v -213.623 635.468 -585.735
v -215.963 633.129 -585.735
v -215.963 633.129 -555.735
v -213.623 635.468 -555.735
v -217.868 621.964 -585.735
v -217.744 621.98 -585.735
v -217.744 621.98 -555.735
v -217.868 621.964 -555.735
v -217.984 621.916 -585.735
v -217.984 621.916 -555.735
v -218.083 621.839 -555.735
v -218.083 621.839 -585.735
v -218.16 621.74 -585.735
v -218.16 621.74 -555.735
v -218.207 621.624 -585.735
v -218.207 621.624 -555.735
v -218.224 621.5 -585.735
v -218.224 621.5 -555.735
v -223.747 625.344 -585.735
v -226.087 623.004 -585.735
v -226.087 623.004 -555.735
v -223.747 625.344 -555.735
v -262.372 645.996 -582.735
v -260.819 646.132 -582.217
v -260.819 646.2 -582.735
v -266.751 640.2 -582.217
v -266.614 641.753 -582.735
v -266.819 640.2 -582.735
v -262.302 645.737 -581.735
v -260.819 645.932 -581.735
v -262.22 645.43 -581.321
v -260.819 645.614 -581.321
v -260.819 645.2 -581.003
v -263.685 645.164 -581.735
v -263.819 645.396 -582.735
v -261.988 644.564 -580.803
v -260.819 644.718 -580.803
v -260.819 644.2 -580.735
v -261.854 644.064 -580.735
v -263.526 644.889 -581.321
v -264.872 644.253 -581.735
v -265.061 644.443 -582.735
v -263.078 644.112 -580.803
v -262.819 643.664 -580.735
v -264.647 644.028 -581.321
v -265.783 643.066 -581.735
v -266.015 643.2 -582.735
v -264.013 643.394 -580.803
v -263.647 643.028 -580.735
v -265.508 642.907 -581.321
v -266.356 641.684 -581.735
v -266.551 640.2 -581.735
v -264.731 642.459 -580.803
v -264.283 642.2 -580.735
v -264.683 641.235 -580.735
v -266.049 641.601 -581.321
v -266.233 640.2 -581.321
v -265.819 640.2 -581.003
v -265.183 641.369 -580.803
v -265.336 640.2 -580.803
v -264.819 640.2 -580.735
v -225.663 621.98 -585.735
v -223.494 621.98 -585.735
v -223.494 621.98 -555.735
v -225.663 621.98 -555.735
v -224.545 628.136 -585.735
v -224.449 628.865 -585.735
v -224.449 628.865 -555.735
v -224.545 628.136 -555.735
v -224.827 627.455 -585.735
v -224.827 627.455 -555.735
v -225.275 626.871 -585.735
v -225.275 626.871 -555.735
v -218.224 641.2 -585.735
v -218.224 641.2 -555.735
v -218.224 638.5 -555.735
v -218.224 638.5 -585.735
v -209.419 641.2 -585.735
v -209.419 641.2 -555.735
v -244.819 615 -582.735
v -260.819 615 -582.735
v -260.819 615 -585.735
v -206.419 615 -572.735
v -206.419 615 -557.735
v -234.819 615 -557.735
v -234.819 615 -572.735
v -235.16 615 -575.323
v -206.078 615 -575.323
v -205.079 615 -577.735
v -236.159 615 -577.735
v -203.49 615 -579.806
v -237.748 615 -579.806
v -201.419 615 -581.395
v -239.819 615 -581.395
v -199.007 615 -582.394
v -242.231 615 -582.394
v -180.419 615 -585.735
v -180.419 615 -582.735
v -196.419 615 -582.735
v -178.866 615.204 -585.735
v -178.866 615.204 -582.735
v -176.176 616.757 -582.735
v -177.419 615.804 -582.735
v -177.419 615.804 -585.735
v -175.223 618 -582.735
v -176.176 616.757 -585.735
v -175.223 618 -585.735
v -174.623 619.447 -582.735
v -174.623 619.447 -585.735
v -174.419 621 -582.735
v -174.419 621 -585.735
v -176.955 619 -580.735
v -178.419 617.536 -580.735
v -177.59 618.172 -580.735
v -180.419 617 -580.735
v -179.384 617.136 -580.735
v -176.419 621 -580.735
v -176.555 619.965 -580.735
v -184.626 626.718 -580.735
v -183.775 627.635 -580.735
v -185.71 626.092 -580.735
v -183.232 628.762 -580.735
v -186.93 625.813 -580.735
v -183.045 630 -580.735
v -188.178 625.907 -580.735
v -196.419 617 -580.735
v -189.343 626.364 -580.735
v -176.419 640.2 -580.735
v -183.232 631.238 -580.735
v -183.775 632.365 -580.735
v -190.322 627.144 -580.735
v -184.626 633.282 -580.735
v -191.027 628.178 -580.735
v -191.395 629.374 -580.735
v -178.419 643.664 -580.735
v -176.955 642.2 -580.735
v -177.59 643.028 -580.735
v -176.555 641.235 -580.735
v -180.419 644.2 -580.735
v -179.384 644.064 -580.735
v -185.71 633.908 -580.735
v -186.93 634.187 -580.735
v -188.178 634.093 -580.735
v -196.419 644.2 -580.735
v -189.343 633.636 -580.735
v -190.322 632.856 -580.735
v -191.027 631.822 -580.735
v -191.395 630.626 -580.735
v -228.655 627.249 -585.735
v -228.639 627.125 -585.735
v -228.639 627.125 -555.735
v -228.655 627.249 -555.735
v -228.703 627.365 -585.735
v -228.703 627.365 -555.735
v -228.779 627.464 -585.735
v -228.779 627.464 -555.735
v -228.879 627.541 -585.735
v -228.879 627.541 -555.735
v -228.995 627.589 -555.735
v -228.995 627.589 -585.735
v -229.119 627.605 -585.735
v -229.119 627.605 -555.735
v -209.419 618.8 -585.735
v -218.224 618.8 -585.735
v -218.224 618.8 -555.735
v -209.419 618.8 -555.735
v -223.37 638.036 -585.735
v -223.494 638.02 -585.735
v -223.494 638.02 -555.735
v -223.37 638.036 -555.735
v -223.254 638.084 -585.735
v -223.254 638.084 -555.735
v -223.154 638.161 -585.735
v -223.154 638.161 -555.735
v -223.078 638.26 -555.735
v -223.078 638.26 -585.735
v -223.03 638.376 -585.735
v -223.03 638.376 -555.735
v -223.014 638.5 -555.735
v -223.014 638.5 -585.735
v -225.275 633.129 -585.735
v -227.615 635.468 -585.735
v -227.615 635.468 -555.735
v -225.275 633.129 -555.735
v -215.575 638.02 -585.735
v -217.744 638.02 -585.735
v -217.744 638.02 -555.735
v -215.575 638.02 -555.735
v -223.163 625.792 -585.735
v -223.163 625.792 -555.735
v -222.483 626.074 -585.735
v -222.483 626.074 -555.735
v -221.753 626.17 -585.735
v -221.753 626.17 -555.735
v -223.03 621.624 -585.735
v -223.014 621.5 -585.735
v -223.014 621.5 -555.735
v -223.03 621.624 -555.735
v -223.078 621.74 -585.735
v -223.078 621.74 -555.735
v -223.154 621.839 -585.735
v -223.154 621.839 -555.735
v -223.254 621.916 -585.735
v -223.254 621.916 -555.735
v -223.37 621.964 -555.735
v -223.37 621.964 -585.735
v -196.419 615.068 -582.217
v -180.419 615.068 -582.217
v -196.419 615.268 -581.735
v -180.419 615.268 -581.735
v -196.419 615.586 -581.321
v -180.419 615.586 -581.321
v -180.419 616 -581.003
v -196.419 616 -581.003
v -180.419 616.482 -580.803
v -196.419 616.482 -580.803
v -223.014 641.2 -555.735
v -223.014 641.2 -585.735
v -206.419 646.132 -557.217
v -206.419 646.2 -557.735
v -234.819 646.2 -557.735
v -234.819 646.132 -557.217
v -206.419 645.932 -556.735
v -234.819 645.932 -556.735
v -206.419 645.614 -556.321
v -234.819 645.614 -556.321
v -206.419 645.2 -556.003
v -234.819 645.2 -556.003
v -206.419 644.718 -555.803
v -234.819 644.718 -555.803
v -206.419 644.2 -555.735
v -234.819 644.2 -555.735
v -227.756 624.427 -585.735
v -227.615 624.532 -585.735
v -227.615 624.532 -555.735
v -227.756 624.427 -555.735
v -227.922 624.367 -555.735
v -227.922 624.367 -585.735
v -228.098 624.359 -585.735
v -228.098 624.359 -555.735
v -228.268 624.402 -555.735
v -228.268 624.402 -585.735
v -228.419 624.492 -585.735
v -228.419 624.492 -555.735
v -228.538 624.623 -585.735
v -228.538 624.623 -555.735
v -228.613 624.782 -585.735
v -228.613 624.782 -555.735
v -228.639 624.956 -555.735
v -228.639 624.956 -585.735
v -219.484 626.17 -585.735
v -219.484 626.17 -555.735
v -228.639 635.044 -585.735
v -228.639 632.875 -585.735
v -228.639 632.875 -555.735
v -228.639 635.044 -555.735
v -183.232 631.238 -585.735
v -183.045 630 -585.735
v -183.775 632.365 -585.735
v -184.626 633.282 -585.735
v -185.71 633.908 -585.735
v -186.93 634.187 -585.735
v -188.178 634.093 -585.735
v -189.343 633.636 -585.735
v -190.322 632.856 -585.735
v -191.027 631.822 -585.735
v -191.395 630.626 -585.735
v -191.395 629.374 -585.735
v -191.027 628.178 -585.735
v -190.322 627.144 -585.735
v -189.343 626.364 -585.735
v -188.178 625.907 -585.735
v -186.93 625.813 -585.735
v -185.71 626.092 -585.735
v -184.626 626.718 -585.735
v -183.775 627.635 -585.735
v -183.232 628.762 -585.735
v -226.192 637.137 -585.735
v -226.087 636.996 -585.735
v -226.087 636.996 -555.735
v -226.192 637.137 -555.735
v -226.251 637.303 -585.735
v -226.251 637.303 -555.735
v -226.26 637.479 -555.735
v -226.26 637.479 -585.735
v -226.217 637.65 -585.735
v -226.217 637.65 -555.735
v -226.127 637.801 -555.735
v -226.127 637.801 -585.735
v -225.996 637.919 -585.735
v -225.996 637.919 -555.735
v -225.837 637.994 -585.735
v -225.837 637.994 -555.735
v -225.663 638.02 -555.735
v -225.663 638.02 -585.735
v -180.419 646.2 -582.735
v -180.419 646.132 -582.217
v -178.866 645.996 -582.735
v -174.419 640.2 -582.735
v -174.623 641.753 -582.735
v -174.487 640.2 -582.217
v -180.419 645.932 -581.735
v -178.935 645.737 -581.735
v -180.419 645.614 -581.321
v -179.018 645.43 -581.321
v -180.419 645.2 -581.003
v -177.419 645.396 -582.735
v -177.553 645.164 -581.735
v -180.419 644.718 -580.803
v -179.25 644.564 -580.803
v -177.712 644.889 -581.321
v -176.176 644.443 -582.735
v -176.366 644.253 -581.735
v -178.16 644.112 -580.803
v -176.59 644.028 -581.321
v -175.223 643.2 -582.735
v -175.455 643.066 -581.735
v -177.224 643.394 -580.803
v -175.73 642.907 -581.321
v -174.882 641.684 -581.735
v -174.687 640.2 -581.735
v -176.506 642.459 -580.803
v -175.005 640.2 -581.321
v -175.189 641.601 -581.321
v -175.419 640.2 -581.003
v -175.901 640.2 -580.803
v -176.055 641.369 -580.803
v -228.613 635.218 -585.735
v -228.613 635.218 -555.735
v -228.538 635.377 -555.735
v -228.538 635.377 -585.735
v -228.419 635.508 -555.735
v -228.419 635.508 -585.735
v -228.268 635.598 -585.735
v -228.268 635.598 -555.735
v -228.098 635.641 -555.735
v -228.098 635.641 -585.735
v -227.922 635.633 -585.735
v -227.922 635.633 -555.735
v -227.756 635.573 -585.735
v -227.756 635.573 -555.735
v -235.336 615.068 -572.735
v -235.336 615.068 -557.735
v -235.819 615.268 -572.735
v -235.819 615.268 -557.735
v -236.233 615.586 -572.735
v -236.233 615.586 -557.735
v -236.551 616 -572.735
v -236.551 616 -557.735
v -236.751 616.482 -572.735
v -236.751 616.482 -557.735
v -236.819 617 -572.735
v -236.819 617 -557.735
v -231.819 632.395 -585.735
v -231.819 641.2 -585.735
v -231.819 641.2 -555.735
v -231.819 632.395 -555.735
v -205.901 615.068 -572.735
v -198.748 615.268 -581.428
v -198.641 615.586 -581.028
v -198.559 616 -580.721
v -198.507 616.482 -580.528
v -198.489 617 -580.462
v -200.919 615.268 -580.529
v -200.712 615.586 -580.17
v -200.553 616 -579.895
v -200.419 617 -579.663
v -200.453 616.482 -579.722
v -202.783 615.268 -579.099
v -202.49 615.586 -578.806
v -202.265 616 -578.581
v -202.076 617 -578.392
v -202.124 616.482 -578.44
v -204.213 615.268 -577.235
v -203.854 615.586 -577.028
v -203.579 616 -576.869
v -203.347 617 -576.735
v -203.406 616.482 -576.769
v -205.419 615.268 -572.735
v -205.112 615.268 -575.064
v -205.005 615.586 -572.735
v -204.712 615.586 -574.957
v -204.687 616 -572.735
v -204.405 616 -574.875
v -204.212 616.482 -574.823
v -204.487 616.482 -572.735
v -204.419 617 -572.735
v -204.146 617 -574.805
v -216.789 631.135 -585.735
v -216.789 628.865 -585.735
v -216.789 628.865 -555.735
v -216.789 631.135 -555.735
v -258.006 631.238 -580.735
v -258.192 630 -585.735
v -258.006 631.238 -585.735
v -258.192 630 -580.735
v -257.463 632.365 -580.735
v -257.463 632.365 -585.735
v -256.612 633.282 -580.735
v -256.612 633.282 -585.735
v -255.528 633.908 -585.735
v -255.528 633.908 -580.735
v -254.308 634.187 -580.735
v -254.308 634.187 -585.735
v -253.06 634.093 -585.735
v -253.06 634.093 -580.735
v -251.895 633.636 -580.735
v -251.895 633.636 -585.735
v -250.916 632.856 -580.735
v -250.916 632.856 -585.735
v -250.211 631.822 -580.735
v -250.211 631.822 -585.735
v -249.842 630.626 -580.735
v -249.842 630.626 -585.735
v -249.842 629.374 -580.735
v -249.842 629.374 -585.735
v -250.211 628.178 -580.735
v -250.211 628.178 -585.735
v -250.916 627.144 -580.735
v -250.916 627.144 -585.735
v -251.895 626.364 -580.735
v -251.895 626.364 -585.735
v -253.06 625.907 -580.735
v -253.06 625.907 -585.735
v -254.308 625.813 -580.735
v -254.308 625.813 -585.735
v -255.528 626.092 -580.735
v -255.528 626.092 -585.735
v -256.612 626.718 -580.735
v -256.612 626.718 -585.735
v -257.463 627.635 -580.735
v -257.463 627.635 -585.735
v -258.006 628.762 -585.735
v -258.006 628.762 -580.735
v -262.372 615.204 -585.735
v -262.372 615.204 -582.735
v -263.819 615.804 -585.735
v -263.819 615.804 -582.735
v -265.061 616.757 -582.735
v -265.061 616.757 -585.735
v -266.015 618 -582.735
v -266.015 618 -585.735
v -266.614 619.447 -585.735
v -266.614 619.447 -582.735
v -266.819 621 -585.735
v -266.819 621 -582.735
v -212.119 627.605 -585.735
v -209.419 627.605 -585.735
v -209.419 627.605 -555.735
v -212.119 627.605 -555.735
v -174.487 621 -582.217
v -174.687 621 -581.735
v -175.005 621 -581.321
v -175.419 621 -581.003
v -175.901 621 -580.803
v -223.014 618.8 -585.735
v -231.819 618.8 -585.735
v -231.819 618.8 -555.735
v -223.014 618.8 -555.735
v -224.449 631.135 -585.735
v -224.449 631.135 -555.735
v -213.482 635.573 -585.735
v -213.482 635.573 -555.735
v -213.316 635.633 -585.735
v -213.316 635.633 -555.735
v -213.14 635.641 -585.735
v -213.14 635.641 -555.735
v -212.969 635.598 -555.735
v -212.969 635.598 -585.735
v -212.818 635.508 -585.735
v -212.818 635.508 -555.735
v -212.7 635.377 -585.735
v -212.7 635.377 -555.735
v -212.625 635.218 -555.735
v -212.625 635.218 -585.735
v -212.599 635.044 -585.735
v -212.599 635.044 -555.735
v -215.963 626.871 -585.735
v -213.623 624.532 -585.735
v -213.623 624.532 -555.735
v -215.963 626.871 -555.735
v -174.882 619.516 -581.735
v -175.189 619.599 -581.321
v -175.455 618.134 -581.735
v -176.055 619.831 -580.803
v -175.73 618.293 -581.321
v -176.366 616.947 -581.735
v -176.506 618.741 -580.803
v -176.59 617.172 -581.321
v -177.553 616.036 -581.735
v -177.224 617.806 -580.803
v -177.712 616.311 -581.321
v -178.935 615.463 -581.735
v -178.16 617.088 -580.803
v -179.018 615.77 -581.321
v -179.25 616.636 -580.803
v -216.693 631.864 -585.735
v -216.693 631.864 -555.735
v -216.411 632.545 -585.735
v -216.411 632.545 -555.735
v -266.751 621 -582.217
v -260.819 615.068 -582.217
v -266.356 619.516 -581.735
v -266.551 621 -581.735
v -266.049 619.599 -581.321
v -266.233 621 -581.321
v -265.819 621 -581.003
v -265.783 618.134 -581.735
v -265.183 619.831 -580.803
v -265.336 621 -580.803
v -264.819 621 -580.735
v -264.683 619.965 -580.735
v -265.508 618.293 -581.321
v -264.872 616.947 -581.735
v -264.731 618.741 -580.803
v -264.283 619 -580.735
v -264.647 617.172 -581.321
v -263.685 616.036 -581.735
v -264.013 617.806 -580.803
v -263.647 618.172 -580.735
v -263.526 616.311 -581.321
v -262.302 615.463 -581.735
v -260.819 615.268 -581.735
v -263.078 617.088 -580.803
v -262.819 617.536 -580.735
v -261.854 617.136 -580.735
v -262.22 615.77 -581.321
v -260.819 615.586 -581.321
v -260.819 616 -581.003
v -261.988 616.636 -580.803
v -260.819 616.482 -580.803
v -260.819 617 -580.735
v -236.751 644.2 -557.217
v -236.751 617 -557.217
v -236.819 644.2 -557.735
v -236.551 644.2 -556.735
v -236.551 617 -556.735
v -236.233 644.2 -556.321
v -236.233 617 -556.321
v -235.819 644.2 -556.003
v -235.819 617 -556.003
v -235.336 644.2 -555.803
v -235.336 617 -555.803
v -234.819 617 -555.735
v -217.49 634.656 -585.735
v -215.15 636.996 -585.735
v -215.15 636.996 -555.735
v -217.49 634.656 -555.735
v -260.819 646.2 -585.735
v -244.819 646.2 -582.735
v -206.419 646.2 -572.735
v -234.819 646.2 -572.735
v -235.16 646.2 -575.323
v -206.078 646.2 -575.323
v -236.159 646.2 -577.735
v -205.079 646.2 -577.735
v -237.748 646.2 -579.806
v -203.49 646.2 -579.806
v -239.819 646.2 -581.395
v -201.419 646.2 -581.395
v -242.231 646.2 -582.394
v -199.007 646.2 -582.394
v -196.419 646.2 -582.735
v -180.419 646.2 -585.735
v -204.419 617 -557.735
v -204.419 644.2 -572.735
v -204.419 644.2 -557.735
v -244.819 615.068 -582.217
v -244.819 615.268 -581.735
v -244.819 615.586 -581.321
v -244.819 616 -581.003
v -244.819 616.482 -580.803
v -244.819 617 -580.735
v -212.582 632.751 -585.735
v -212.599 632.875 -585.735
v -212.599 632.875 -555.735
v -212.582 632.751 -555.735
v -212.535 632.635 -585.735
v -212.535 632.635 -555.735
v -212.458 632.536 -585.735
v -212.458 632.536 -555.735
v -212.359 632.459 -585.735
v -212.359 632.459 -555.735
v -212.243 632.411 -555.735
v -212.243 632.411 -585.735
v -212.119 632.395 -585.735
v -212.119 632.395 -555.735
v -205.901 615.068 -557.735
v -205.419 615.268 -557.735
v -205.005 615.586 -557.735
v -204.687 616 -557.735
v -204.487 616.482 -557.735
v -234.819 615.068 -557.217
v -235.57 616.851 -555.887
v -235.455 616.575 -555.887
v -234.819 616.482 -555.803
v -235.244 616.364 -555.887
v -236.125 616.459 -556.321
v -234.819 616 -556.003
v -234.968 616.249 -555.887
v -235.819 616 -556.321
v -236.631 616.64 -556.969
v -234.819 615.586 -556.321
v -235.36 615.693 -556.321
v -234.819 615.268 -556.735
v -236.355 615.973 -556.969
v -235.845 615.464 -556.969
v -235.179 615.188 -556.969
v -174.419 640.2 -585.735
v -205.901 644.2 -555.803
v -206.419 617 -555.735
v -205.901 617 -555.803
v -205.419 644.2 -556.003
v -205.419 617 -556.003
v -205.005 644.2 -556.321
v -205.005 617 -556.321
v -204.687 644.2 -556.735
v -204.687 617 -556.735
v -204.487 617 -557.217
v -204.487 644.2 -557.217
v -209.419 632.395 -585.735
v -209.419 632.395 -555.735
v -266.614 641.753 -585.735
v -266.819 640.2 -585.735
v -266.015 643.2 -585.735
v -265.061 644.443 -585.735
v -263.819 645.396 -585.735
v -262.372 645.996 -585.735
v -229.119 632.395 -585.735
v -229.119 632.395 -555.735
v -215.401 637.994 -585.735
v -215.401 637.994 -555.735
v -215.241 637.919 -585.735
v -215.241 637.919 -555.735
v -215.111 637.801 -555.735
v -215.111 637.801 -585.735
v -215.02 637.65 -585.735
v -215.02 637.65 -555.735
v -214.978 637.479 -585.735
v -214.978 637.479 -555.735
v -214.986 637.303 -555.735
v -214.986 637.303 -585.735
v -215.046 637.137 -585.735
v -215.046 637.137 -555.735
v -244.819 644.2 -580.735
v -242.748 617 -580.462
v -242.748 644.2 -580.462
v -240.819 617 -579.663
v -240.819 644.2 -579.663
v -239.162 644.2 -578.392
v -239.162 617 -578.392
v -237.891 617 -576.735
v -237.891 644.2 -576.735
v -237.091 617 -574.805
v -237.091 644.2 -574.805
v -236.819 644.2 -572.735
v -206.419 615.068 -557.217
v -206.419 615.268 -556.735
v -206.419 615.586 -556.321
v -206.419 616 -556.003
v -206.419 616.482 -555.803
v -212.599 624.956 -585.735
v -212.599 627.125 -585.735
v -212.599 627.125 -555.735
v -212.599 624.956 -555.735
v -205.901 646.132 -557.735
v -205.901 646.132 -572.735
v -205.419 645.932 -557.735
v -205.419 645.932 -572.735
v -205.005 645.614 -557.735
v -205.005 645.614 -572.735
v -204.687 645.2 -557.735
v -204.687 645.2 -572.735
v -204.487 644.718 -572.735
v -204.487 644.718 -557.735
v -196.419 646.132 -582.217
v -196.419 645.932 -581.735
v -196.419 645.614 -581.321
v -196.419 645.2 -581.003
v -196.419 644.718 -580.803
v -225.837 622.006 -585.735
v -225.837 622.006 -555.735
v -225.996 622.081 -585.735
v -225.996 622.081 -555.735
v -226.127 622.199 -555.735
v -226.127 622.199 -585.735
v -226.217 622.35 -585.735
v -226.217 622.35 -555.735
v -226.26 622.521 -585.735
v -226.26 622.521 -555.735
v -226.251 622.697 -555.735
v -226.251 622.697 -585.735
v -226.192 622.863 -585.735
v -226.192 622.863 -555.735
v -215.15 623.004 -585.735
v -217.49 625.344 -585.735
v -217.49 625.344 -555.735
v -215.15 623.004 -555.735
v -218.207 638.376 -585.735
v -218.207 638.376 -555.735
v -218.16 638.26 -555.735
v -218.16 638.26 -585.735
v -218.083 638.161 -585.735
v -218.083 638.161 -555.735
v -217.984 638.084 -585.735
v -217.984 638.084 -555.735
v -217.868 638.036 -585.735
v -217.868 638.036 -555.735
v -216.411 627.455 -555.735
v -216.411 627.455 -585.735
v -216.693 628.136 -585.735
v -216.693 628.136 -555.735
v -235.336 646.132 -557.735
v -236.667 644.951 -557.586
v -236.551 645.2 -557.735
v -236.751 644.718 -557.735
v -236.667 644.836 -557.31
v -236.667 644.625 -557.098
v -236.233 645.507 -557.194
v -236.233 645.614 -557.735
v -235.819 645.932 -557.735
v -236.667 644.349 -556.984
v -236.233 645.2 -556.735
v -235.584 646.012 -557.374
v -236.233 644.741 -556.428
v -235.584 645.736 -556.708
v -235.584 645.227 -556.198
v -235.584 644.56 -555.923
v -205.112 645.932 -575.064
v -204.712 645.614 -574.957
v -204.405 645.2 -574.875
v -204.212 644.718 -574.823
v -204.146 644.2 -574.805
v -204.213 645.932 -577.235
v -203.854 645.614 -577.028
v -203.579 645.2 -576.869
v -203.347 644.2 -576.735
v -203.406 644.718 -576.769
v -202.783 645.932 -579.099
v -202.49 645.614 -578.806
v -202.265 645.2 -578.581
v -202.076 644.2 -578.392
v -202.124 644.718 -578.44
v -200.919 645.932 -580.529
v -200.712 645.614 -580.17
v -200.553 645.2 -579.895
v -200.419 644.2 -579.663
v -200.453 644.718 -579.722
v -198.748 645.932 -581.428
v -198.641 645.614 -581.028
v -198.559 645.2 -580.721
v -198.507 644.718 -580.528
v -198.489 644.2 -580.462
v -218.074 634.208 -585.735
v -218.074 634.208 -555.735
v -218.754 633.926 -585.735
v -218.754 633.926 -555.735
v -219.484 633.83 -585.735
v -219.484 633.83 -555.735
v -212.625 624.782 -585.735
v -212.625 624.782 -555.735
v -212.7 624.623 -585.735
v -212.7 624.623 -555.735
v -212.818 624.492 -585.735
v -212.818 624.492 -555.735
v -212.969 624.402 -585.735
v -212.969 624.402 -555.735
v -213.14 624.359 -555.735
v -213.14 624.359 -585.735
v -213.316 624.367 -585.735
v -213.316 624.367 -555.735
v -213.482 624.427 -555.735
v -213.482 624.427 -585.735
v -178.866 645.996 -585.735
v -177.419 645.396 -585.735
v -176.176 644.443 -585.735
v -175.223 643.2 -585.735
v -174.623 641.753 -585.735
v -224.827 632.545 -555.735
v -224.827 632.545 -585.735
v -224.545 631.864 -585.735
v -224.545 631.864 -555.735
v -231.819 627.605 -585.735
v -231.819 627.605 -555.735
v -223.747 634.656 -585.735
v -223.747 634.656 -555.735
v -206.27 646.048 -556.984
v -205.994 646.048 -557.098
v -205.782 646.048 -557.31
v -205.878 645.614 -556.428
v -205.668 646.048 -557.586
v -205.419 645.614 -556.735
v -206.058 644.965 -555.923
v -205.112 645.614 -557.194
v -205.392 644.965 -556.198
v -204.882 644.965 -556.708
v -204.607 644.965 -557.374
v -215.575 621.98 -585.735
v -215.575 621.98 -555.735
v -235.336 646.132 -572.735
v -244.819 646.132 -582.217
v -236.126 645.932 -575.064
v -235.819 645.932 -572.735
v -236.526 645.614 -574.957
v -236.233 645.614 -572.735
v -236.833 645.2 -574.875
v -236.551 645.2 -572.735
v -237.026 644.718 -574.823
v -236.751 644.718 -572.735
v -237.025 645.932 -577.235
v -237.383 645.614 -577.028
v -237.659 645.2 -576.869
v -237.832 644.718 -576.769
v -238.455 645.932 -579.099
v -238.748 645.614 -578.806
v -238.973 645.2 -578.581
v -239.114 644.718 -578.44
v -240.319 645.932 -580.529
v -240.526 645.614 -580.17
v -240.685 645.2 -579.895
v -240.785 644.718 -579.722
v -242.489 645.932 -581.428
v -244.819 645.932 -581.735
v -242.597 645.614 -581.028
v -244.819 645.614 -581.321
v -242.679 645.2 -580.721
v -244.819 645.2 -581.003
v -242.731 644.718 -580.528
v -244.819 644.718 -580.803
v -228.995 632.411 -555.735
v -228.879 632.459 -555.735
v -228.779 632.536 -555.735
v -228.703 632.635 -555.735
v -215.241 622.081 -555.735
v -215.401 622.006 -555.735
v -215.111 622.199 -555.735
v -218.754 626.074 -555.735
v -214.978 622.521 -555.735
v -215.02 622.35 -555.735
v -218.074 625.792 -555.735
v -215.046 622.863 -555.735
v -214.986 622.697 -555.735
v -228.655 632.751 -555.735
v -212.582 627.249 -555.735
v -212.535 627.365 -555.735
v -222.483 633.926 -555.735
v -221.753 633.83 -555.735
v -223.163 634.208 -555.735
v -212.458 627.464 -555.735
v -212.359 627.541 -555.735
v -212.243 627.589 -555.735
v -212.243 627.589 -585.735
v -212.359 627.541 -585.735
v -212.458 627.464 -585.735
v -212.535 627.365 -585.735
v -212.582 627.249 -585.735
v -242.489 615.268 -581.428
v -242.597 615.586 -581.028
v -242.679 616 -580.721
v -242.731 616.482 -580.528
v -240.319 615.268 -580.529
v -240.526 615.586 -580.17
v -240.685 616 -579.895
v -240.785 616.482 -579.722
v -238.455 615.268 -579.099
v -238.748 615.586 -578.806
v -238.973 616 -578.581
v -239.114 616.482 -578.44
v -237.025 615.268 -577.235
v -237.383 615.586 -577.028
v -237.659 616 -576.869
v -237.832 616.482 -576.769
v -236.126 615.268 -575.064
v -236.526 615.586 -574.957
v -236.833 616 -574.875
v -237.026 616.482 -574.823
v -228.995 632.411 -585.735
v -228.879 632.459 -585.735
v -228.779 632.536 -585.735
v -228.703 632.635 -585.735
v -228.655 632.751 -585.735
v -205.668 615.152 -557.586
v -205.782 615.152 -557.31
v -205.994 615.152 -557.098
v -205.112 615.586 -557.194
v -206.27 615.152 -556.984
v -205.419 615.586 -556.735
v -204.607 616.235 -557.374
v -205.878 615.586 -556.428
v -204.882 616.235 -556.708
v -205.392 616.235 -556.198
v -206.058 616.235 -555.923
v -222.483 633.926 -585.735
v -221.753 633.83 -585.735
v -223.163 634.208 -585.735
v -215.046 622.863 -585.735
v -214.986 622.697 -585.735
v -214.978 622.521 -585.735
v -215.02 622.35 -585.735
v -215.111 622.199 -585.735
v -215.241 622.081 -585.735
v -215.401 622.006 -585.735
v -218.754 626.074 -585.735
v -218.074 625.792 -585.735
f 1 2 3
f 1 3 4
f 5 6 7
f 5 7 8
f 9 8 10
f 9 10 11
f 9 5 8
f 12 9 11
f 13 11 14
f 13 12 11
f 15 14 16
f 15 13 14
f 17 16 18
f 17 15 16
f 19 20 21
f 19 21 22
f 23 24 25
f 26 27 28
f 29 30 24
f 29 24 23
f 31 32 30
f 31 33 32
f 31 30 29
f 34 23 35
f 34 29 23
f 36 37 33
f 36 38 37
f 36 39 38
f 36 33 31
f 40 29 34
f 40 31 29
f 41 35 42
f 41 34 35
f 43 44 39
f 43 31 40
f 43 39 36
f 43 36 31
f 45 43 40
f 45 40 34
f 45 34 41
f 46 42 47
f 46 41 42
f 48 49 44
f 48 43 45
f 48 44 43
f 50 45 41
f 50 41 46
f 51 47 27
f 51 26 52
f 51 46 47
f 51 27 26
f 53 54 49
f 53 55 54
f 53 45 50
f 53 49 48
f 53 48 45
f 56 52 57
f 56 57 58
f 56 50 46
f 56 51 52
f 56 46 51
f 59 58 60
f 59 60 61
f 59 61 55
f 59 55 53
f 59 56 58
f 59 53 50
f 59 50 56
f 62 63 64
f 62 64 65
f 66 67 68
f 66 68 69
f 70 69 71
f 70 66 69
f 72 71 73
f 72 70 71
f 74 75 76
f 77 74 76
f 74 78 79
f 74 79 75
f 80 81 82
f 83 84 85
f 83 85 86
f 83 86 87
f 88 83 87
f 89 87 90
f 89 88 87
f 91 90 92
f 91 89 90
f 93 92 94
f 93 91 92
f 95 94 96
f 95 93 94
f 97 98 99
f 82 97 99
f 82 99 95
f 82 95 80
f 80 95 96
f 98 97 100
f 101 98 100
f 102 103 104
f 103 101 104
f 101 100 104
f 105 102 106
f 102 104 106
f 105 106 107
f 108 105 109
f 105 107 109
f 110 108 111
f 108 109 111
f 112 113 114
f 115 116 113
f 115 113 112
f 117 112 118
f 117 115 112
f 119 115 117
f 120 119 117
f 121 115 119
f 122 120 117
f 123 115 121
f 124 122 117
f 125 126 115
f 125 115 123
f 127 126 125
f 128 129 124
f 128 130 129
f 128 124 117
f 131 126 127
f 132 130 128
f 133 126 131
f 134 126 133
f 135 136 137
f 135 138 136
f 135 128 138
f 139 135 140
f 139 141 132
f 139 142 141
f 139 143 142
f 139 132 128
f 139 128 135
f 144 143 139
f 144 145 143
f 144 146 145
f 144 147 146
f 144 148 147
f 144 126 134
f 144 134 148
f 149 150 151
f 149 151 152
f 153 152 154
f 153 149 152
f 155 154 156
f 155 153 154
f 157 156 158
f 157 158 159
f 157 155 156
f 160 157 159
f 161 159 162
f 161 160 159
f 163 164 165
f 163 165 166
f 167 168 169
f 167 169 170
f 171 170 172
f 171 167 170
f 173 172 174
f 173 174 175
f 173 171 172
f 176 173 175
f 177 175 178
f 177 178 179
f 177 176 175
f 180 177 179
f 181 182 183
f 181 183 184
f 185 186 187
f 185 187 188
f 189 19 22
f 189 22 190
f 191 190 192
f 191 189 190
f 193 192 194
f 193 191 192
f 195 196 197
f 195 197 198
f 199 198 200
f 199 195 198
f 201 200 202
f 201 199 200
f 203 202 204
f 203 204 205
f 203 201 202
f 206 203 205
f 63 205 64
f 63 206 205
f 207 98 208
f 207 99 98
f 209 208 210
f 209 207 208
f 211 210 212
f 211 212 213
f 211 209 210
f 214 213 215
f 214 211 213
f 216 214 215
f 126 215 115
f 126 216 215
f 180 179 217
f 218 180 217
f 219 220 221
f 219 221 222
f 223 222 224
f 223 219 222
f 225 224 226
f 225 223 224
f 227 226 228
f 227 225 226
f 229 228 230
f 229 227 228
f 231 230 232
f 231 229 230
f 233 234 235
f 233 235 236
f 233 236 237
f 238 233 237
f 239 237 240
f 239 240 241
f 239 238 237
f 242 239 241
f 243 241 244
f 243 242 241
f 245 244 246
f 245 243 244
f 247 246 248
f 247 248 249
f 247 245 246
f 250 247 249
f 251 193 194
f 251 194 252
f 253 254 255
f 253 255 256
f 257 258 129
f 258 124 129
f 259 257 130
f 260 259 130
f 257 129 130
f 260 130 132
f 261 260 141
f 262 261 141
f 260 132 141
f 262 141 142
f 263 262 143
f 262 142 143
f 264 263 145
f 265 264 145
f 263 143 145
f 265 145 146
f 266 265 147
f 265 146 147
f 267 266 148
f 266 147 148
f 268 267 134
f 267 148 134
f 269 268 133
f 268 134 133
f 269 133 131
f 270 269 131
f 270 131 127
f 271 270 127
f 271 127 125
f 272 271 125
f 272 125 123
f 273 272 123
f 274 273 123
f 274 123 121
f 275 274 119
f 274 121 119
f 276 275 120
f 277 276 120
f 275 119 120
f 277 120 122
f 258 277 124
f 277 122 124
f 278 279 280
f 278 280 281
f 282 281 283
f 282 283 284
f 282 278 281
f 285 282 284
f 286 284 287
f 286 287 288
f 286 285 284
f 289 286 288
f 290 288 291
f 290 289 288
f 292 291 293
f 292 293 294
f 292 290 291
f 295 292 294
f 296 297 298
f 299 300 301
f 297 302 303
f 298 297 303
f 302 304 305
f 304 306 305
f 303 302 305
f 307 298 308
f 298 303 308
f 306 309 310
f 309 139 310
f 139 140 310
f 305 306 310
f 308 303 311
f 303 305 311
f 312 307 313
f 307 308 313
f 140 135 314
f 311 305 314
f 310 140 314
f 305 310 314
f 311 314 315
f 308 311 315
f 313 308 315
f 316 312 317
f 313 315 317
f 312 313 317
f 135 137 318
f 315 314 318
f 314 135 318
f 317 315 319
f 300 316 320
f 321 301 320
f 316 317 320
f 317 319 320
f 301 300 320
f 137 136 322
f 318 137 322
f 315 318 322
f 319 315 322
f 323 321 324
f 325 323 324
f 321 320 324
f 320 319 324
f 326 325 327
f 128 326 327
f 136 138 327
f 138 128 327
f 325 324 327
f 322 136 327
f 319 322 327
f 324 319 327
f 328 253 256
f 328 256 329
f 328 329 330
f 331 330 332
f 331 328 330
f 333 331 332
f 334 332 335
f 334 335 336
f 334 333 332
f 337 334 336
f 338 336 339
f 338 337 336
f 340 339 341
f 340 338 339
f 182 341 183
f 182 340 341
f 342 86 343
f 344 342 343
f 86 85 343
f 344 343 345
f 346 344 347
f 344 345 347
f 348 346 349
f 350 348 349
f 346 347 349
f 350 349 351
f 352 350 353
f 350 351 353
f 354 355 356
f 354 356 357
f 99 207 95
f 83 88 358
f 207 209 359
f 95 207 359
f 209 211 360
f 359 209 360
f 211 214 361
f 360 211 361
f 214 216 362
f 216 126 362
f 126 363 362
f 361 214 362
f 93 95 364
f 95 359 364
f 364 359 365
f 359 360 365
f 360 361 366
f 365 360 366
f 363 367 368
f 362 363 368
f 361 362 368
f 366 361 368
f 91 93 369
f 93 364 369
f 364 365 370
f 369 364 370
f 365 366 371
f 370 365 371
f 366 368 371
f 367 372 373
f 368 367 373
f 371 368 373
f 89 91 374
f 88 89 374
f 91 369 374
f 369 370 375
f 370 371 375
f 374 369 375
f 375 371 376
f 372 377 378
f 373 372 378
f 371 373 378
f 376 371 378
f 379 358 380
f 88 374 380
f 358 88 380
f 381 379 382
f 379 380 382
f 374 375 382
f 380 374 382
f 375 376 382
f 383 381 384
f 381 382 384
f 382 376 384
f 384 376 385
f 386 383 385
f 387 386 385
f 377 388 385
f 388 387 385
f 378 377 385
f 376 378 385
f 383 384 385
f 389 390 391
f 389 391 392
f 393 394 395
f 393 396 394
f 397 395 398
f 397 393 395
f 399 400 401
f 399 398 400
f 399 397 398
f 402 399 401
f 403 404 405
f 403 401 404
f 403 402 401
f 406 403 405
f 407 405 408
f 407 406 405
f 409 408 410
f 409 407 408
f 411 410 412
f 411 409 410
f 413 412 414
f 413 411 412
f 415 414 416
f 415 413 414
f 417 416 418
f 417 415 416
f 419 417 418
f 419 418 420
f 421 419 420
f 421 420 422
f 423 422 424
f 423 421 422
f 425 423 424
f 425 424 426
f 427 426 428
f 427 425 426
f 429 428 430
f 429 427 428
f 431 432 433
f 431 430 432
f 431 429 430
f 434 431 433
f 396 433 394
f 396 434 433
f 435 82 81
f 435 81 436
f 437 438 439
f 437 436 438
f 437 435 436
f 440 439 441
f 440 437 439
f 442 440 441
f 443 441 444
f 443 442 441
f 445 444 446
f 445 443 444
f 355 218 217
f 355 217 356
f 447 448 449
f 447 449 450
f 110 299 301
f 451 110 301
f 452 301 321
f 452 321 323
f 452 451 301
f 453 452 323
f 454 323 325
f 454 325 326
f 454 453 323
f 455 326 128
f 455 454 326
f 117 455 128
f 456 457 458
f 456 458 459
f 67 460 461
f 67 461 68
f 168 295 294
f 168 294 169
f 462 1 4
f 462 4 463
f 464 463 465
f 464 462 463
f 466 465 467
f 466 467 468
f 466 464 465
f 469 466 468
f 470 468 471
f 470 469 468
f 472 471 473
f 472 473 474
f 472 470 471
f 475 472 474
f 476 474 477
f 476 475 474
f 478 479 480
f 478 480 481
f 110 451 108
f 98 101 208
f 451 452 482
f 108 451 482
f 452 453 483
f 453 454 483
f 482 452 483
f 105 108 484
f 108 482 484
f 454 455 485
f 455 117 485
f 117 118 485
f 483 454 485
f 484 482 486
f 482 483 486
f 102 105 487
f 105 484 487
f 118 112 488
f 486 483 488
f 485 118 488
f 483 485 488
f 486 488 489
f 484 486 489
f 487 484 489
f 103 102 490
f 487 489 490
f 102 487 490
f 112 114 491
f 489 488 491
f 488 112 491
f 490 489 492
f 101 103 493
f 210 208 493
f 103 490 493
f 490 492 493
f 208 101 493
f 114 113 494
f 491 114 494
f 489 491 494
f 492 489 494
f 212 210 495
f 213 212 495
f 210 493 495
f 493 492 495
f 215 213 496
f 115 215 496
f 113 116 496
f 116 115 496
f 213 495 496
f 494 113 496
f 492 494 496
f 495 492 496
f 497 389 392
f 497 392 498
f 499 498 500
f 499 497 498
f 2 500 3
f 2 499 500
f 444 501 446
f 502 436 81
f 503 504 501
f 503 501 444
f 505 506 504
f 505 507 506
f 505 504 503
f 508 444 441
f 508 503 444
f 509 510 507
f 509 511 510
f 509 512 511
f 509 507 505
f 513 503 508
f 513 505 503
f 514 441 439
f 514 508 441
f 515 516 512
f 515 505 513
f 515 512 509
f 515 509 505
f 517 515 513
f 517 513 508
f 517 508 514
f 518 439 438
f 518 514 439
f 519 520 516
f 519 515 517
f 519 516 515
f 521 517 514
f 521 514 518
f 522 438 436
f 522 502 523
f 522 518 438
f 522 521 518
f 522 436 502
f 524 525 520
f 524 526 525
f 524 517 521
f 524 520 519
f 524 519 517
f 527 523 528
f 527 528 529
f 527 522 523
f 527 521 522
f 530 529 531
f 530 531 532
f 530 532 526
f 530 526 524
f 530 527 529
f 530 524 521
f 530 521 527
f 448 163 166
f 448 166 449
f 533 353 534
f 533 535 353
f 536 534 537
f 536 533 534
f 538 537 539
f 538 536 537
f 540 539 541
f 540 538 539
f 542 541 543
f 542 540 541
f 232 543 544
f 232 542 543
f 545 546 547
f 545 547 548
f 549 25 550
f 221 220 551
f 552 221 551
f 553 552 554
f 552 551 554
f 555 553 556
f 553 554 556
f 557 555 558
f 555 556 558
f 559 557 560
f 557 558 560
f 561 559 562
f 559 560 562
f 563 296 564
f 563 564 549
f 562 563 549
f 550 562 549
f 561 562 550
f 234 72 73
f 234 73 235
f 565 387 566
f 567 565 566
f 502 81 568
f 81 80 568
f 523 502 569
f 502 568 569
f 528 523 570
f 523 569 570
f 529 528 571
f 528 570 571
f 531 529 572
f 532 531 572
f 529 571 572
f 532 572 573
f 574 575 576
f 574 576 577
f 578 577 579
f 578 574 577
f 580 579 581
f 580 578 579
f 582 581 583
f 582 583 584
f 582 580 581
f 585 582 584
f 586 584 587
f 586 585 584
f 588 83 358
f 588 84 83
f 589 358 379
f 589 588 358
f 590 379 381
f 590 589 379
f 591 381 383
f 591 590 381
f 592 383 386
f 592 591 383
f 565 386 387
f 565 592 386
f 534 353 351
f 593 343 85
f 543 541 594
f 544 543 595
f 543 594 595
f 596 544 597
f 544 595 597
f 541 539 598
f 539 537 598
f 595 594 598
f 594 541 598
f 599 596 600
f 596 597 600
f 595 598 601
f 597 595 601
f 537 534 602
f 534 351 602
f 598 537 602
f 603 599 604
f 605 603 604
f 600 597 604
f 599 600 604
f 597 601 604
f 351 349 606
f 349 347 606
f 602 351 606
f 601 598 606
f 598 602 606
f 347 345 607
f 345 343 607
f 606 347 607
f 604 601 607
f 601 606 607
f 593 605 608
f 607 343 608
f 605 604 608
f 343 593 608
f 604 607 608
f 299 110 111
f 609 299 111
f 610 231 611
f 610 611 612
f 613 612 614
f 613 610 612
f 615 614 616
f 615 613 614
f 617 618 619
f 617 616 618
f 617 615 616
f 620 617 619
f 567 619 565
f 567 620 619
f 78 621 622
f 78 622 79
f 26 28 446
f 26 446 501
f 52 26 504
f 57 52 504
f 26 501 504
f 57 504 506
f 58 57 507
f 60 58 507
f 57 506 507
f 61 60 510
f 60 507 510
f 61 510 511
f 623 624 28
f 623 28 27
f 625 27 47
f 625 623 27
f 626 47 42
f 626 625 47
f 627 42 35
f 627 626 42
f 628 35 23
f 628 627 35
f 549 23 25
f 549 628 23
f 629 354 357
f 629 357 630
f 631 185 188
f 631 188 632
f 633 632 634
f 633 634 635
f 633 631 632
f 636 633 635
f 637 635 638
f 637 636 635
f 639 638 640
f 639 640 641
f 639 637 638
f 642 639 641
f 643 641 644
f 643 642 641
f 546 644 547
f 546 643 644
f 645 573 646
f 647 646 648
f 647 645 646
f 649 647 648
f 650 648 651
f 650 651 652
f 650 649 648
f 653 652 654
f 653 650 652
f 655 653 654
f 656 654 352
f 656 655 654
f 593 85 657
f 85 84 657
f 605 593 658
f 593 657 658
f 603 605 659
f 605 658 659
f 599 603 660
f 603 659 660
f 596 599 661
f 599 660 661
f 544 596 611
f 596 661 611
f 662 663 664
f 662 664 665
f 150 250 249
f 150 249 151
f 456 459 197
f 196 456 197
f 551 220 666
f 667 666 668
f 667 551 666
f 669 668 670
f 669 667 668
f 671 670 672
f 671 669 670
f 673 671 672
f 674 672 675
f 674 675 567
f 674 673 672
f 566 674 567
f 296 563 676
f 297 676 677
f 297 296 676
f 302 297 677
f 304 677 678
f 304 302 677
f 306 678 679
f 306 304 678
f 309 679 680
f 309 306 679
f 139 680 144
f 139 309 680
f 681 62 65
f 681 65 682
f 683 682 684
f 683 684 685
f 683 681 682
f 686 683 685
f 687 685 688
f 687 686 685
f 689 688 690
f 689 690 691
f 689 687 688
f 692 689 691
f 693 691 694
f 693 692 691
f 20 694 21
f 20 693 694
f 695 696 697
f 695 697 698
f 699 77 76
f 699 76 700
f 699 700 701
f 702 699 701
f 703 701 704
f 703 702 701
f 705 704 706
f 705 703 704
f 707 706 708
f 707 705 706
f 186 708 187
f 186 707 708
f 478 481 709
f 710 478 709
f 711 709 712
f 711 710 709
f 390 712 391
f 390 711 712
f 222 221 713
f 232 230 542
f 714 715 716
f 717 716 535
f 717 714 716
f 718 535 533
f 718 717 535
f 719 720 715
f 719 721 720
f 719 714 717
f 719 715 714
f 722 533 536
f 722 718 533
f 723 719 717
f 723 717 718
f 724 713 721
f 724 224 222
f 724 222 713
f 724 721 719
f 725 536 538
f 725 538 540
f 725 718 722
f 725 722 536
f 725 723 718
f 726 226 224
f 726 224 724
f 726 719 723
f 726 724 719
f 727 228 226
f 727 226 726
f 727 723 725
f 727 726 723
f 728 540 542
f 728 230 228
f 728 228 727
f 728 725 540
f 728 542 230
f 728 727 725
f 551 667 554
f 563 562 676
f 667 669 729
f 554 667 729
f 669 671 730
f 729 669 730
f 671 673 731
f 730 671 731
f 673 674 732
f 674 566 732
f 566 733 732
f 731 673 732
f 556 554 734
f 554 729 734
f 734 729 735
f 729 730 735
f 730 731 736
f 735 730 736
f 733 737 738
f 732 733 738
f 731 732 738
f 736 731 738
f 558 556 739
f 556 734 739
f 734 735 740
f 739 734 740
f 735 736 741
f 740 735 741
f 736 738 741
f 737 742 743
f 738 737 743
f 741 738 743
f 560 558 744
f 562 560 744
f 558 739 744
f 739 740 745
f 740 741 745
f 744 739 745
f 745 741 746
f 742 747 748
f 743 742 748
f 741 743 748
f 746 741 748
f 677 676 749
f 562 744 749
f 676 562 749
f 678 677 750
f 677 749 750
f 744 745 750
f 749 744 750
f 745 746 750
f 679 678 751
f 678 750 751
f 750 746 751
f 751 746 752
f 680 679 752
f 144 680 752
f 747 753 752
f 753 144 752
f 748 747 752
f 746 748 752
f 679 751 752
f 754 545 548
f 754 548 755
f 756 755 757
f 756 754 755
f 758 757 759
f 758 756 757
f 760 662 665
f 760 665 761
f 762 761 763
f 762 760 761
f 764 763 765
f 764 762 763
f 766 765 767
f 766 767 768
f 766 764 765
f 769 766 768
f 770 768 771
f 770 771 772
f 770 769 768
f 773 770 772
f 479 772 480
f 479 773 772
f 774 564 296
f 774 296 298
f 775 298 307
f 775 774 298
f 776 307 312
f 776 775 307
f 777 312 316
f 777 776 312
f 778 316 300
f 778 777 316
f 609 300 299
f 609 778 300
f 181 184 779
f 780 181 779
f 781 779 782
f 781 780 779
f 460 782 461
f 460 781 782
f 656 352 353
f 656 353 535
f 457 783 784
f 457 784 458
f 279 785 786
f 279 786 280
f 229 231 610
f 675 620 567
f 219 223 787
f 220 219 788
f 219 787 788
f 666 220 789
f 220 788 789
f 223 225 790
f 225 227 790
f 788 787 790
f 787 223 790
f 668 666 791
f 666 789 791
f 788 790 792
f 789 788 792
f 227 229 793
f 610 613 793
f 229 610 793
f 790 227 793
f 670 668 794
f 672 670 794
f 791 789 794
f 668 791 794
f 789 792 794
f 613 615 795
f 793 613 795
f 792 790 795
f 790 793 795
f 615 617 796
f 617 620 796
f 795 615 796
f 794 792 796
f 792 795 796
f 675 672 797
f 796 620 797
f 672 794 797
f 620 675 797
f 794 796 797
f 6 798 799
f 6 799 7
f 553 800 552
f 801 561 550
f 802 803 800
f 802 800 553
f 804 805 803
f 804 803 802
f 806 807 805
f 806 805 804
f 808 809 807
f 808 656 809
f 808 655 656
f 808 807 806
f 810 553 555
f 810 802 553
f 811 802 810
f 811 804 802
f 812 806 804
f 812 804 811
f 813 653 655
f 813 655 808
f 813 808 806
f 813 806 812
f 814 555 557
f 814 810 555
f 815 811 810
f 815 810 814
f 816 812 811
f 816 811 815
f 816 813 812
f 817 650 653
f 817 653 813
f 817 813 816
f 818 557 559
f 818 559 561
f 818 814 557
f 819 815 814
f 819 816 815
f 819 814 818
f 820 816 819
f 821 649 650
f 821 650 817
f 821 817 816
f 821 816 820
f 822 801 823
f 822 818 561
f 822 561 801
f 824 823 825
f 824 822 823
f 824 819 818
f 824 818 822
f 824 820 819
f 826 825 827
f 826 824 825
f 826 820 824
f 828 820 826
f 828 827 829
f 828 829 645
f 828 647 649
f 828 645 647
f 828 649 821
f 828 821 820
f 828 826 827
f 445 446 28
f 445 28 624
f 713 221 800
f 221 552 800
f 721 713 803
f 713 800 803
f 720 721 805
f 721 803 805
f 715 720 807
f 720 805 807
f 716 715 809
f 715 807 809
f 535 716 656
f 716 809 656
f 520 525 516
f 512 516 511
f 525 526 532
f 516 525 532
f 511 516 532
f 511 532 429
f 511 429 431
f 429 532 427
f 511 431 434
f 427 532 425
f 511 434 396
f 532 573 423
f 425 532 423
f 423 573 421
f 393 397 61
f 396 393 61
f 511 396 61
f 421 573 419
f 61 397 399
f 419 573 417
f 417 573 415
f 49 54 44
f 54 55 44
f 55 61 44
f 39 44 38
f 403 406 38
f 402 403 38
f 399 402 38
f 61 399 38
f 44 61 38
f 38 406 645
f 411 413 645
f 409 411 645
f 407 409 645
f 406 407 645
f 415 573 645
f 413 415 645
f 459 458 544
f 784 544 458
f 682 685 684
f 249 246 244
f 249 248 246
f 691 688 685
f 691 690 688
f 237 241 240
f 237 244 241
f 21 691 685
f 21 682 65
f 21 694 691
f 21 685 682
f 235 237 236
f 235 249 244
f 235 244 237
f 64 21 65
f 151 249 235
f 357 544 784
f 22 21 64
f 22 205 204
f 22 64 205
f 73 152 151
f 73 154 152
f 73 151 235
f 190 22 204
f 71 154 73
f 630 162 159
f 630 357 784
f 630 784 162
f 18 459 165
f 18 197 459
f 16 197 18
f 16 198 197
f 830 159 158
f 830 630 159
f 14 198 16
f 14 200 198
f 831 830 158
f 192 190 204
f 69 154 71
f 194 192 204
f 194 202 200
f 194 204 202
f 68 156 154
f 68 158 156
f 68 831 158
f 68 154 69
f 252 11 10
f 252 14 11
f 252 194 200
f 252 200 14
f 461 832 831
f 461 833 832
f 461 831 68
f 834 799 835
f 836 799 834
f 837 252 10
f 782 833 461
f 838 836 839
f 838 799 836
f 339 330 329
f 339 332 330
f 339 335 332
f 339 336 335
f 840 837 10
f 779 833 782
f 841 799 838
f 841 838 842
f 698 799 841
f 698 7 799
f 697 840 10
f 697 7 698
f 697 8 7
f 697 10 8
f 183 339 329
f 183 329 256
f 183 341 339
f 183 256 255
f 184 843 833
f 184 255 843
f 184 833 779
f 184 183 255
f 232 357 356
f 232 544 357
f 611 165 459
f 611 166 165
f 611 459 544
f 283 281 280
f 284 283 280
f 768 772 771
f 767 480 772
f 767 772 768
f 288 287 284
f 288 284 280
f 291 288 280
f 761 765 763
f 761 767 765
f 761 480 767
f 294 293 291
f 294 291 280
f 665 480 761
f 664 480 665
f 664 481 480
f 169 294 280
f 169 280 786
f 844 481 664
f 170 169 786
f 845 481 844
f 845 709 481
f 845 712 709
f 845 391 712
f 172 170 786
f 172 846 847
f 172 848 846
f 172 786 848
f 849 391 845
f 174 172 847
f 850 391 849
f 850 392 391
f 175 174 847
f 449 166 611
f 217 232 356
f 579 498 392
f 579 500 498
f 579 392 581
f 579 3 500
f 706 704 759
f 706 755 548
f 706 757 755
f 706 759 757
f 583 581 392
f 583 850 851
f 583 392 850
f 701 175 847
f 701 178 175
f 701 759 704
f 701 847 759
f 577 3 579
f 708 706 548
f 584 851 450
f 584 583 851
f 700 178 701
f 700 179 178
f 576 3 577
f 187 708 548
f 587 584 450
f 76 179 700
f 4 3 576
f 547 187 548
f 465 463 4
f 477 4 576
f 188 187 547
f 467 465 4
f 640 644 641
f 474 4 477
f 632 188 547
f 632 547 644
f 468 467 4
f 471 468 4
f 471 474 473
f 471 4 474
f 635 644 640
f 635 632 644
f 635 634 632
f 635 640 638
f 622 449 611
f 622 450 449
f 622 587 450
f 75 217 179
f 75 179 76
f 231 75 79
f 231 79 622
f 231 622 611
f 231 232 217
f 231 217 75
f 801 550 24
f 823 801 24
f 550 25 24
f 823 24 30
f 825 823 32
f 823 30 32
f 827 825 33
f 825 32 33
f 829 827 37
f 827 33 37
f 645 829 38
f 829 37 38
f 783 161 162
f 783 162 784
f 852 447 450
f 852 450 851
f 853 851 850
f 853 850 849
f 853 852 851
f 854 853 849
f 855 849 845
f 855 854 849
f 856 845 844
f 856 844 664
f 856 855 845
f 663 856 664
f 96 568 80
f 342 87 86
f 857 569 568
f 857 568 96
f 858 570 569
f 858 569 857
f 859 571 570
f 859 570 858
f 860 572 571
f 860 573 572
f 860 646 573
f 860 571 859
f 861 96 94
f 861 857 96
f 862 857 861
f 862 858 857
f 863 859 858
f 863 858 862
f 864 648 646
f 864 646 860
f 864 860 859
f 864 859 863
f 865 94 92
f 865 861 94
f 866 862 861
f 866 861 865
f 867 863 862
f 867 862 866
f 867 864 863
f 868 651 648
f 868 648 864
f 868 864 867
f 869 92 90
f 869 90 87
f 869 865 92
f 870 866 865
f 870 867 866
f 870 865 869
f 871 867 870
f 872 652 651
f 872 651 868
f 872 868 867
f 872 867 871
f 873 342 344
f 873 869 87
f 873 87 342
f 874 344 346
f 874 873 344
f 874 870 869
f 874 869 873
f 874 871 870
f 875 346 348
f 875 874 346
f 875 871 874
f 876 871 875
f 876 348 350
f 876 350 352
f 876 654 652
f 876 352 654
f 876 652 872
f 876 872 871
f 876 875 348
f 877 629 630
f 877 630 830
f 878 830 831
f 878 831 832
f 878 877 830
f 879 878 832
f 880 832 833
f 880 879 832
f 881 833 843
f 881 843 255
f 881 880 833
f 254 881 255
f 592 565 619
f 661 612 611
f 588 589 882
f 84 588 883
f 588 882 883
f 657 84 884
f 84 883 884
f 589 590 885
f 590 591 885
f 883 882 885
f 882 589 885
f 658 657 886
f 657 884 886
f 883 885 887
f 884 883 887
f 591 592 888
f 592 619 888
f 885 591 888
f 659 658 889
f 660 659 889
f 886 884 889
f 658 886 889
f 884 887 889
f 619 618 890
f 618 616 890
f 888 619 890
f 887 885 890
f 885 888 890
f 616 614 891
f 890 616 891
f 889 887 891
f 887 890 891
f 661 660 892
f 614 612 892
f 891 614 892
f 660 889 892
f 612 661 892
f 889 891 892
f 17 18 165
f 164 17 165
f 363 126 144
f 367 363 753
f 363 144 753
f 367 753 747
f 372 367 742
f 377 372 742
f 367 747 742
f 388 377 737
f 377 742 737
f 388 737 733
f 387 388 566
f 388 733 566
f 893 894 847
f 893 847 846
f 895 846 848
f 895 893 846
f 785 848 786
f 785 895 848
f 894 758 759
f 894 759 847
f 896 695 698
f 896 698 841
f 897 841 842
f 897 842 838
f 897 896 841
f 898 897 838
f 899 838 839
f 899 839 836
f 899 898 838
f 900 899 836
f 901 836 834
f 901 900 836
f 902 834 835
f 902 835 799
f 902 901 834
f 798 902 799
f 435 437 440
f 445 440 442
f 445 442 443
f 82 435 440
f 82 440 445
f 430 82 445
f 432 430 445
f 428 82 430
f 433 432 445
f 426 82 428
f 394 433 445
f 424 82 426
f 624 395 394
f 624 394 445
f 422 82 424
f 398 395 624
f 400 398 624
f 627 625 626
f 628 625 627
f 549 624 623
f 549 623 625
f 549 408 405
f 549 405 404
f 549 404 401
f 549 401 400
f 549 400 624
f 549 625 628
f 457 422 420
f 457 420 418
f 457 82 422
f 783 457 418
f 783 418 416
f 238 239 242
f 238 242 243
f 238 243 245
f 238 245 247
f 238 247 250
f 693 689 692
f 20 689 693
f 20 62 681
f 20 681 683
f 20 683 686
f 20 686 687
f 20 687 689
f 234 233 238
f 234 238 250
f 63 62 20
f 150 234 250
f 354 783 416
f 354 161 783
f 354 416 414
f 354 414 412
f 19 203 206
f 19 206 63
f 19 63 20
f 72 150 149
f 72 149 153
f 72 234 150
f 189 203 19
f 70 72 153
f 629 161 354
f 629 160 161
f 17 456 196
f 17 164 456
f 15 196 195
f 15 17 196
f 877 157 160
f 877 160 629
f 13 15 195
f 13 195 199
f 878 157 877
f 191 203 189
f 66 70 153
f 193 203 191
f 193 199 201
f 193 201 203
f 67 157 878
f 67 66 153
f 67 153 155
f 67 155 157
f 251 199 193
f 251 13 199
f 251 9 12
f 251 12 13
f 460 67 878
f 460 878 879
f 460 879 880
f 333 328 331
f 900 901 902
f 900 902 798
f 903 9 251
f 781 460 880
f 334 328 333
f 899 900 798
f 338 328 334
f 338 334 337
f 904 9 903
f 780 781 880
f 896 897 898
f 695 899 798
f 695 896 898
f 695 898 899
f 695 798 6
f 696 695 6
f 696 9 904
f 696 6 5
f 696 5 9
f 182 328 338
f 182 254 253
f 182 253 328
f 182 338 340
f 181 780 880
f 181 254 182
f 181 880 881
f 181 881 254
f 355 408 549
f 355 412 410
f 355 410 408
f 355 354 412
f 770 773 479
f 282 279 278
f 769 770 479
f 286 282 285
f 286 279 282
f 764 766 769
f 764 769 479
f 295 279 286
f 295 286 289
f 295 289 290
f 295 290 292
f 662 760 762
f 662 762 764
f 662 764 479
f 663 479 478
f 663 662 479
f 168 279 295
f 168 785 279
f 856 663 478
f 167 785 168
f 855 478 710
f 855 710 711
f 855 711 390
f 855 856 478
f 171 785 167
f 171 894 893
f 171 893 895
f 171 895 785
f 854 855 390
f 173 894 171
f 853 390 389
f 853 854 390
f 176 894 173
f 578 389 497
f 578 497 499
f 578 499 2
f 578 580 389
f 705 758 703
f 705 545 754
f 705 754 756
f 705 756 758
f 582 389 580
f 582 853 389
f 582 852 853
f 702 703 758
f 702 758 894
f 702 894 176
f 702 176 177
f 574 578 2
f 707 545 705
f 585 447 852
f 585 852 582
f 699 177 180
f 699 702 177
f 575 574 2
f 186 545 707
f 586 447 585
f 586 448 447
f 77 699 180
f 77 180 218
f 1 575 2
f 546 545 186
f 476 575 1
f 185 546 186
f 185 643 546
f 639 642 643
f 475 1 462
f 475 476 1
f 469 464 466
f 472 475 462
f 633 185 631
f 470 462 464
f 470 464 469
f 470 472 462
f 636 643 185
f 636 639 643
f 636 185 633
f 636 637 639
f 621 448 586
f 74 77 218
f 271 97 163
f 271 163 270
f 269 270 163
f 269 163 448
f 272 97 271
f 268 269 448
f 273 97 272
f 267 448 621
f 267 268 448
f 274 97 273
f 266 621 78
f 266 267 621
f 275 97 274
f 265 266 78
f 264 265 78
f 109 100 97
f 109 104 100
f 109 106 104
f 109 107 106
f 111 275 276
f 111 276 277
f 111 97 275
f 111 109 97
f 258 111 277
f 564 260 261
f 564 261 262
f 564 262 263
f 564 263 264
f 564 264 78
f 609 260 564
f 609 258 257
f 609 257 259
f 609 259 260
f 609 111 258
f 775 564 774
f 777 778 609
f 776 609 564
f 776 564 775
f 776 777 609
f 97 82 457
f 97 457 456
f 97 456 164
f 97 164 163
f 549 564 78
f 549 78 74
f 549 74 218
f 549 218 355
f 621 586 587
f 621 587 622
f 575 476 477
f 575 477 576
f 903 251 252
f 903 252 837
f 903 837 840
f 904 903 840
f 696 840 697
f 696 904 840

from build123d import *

# Parameters (mm, degrees)
SKETCH2_W           = 32.4
SKETCH2_H           = 31.2
BOSS_EXTRUDE1_DEPTH = 30
SKETCH3_W           = 5
SKETCH3_H           = 31.2
BOSS_EXTRUDE2_DEPTH = 30
SKETCH4_R           = 4.198469776
CUT_EXTRUDE1_DEPTH  = 15
FILLET6_R           = 8
FILLET7_R           = 6
FILLET8_R           = 2


with BuildPart() as part:
    # Sketch2 → Boss-Extrude1 (new body)
    with BuildSketch(Plane.XY.offset(-585.734831934)):
        with Locations((-220.618842126, 630.6)):
            Rectangle(SKETCH2_W, SKETCH2_H)
        with BuildLine():
            Line((-218.223842126, 639.2), (-218.223842126, 638.500000763))
            ThreePointArc((-218.223842126, 638.500000763), (-218.083253443, 638.160589569), (-217.743842299, 638.020000763))
            Line((-217.743842299, 638.020000763), (-215.574720714, 638.019999981))
            ThreePointArc((-215.574720714, 638.019999981), (-215.020393169, 637.649609941), (-215.150456861, 636.995735913))
            Line((-215.150456861, 636.995735913), (-217.490233892, 634.655958882))
            ThreePointArc((-217.490233892, 634.655958882), (-218.405107733, 634.044659724), (-219.484275009, 633.830000005))
            Line((-219.484275009, 633.830000005), (-221.753409227, 633.83))
            ThreePointArc((-221.753409227, 633.83), (-222.83257651, 634.044659717), (-223.747450356, 634.655958877))
            Line((-223.747450356, 634.655958877), (-226.087227386, 636.995735907))
            ThreePointArc((-226.087227386, 636.995735907), (-226.217291078, 637.649609934), (-225.662963535, 638.019999975))
            Line((-225.662963535, 638.019999975), (-223.493841952, 638.020000763))
            ThreePointArc((-223.493841952, 638.020000763), (-223.15443081, 638.16058957), (-223.013842126, 638.500000763))
            Line((-223.013842126, 638.500000763), (-223.013842126, 639.2))
            Line((-223.013842126, 639.2), (-223.013842126, 641.2))
            Line((-223.013842126, 641.2), (-231.818842126, 641.2))
            Line((-231.818842126, 641.2), (-231.818842126, 632.395))
            Line((-231.818842126, 632.395), (-229.818842126, 632.395))
            Line((-229.818842126, 632.395), (-229.118842889, 632.395))
            ThreePointArc((-229.118842889, 632.395), (-228.779431696, 632.535588684), (-228.638842889, 632.874999827))
            Line((-228.638842889, 632.874999827), (-228.638842108, 635.044121413))
            ThreePointArc((-228.638842108, 635.044121413), (-228.268452067, 635.598448957), (-227.614578039, 635.468385265))
            Line((-227.614578039, 635.468385265), (-225.274801008, 633.128608235))
            ThreePointArc((-225.274801008, 633.128608235), (-224.663501851, 632.213734394), (-224.448842131, 631.134567117))
            Line((-224.448842131, 631.134567117), (-224.448842127, 628.865432899))
            ThreePointArc((-224.448842127, 628.865432899), (-224.663501844, 627.786265617), (-225.274801004, 626.87139177))
            Line((-225.274801004, 626.87139177), (-227.614578033, 624.531614741))
            ThreePointArc((-227.614578033, 624.531614741), (-228.268452061, 624.401551048), (-228.638842102, 624.955878592))
            Line((-228.638842102, 624.955878592), (-228.638842889, 627.125000174))
            ThreePointArc((-228.638842889, 627.125000174), (-228.779431696, 627.464411317), (-229.118842889, 627.605))
            Line((-229.118842889, 627.605), (-229.818842126, 627.605))
            Line((-229.818842126, 627.605), (-231.818842126, 627.605))
            Line((-231.818842126, 627.605), (-231.818842126, 618.8))
            Line((-231.818842126, 618.8), (-223.013842126, 618.8))
            Line((-223.013842126, 618.8), (-223.013842126, 620.8))
            Line((-223.013842126, 620.8), (-223.013842126, 621.499999237))
            ThreePointArc((-223.013842126, 621.499999237), (-223.15443081, 621.839410431), (-223.493841954, 621.979999237))
            Line((-223.493841954, 621.979999237), (-225.662963539, 621.980000019))
            ThreePointArc((-225.662963539, 621.980000019), (-226.217291084, 622.350390059), (-226.087227392, 623.004264087))
            Line((-226.087227392, 623.004264087), (-223.747450361, 625.344041118))
            ThreePointArc((-223.747450361, 625.344041118), (-222.83257652, 625.955340276), (-221.753409244, 626.169999995))
            Line((-221.753409244, 626.169999995), (-219.484275025, 626.17))
            ThreePointArc((-219.484275025, 626.17), (-218.405107743, 625.955340283), (-217.490233897, 625.344041123))
            Line((-217.490233897, 625.344041123), (-215.150456867, 623.004264093))
            ThreePointArc((-215.150456867, 623.004264093), (-215.020393175, 622.350390066), (-215.574720718, 621.980000025))
            Line((-215.574720718, 621.980000025), (-217.743842301, 621.979999237))
            ThreePointArc((-217.743842301, 621.979999237), (-218.083253443, 621.83941043), (-218.223842126, 621.499999237))
            Line((-218.223842126, 621.499999237), (-218.223842126, 620.8))
            Line((-218.223842126, 620.8), (-218.223842126, 618.8))
            Line((-218.223842126, 618.8), (-209.418842126, 618.8))
            Line((-209.418842126, 618.8), (-209.418842126, 627.605))
            Line((-209.418842126, 627.605), (-211.418842126, 627.605))
            Line((-211.418842126, 627.605), (-212.118841364, 627.605))
            ThreePointArc((-212.118841364, 627.605), (-212.458252557, 627.464411316), (-212.598841364, 627.125000173))
            Line((-212.598841364, 627.125000173), (-212.598842145, 624.955878587))
            ThreePointArc((-212.598842145, 624.955878587), (-212.969232185, 624.401551043), (-213.623106214, 624.531614735))
            Line((-213.623106214, 624.531614735), (-215.962883245, 626.871391765))
            ThreePointArc((-215.962883245, 626.871391765), (-216.574182402, 627.786265606), (-216.788842122, 628.865432883))
            Line((-216.788842122, 628.865432883), (-216.788842126, 631.134567101))
            ThreePointArc((-216.788842126, 631.134567101), (-216.574182409, 632.213734383), (-215.962883249, 633.12860823))
            Line((-215.962883249, 633.12860823), (-213.62310622, 635.468385259))
            ThreePointArc((-213.62310622, 635.468385259), (-212.969232192, 635.598448952), (-212.598842151, 635.044121408))
            Line((-212.598842151, 635.044121408), (-212.598841364, 632.874999826))
            ThreePointArc((-212.598841364, 632.874999826), (-212.458252557, 632.535588683), (-212.118841364, 632.395))
            Line((-212.118841364, 632.395), (-211.418842126, 632.395))
            Line((-211.418842126, 632.395), (-209.418842126, 632.395))
            Line((-209.418842126, 632.395), (-209.418842126, 641.2))
            Line((-209.418842126, 641.2), (-218.223842126, 641.2))
            Line((-218.223842126, 641.2), (-218.223842126, 639.2))
        make_face(mode=Mode.SUBTRACT)
    extrude(amount=BOSS_EXTRUDE1_DEPTH)

    # Sketch3 → Boss-Extrude2 (add)
    with BuildSketch(Plane(origin=(-204.418842126, 0, 0), x_dir=(0, 0, -1), z_dir=(1, 0, 0))):
        with Locations((583.234831934, 630.6)):
            Rectangle(SKETCH3_W, SKETCH3_H)
    boss_extrude2 = extrude(amount=BOSS_EXTRUDE2_DEPTH)

    # Sketch4 → Cut-Extrude1 (cut, symmetric)
    with BuildSketch(Plane.XY.offset(-580.734831934)):
        with Locations((-187.243842126, 630)):
            Circle(SKETCH4_R)
    cut_extrude1 = extrude(amount=CUT_EXTRUDE1_DEPTH, both=True, mode=Mode.SUBTRACT)

    # Mirror6: Boss-Extrude2 across plane
    add(boss_extrude2.mirror(Plane(origin=(-220.618842126, 0, 0), x_dir=(0, 0, 1), z_dir=(1, 0, 0))))

    # Mirror9: Cut-Extrude1 across plane
    add(cut_extrude1.mirror(Plane(origin=(-220.618842126, 0, 0), x_dir=(0, 0, 1), z_dir=(1, 0, 0))), mode=Mode.SUBTRACT)

    # Fillet6
    fillet6_edges = [part.edges().sort_by_distance(p)[0] for p in [
        (-204.418842126, 630.6, -580.734831934),
        (-236.818842126, 630.6, -580.734831934),
    ]]
    fillet(fillet6_edges, radius=FILLET6_R)

    # Fillet7
    fillet7_edges = [part.edges().sort_by_distance(p)[0] for p in [
        (-174.418842126, 646.2, -583.234831934),
        (-174.418842126, 615, -583.234831934),
        (-266.818842126, 615, -583.234831934),
        (-266.818842126, 646.2, -583.234831934),
    ]]
    fillet(fillet7_edges, radius=FILLET7_R)

    # Fillet8
    fillet8_edges = [part.edges().sort_by_distance(p)[0] for p in [
        (-204.418842126, 630.6, -555.734831934),
        (-220.618842126, 646.2, -555.734831934),
        (-239.161987877, 615, -578.391686183),
        (-239.161987877, 646.2, -578.391686183),
        (-202.075696376, 615, -578.391686183),
        (-202.075696376, 646.2, -578.391686183),
        (-188.418842126, 615, -580.734831934),
        (-252.818842126, 615, -580.734831934),
        (-266.818842126, 630.6, -580.734831934),
        (-252.818842126, 646.2, -580.734831934),
        (-265.061482814, 644.442640687, -580.734831934),
        (-265.061482814, 616.757359313, -580.734831934),
        (-188.418842126, 646.2, -580.734831934),
        (-174.418842126, 630.6, -580.734831934),
        (-176.176201439, 644.442640687, -580.734831934),
        (-176.176201439, 616.757359313, -580.734831934),
        (-236.818842126, 630.6, -555.734831934),
        (-236.818842126, 646.2, -564.234831934),
        (-204.418842126, 646.2, -564.234831934),
        (-204.418842126, 615, -564.234831934),
        (-236.818842126, 615, -564.234831934),
        (-220.618842126, 615, -555.734831934),
    ]]
    fillet(fillet8_edges, radius=FILLET8_R)


solid = part.part
